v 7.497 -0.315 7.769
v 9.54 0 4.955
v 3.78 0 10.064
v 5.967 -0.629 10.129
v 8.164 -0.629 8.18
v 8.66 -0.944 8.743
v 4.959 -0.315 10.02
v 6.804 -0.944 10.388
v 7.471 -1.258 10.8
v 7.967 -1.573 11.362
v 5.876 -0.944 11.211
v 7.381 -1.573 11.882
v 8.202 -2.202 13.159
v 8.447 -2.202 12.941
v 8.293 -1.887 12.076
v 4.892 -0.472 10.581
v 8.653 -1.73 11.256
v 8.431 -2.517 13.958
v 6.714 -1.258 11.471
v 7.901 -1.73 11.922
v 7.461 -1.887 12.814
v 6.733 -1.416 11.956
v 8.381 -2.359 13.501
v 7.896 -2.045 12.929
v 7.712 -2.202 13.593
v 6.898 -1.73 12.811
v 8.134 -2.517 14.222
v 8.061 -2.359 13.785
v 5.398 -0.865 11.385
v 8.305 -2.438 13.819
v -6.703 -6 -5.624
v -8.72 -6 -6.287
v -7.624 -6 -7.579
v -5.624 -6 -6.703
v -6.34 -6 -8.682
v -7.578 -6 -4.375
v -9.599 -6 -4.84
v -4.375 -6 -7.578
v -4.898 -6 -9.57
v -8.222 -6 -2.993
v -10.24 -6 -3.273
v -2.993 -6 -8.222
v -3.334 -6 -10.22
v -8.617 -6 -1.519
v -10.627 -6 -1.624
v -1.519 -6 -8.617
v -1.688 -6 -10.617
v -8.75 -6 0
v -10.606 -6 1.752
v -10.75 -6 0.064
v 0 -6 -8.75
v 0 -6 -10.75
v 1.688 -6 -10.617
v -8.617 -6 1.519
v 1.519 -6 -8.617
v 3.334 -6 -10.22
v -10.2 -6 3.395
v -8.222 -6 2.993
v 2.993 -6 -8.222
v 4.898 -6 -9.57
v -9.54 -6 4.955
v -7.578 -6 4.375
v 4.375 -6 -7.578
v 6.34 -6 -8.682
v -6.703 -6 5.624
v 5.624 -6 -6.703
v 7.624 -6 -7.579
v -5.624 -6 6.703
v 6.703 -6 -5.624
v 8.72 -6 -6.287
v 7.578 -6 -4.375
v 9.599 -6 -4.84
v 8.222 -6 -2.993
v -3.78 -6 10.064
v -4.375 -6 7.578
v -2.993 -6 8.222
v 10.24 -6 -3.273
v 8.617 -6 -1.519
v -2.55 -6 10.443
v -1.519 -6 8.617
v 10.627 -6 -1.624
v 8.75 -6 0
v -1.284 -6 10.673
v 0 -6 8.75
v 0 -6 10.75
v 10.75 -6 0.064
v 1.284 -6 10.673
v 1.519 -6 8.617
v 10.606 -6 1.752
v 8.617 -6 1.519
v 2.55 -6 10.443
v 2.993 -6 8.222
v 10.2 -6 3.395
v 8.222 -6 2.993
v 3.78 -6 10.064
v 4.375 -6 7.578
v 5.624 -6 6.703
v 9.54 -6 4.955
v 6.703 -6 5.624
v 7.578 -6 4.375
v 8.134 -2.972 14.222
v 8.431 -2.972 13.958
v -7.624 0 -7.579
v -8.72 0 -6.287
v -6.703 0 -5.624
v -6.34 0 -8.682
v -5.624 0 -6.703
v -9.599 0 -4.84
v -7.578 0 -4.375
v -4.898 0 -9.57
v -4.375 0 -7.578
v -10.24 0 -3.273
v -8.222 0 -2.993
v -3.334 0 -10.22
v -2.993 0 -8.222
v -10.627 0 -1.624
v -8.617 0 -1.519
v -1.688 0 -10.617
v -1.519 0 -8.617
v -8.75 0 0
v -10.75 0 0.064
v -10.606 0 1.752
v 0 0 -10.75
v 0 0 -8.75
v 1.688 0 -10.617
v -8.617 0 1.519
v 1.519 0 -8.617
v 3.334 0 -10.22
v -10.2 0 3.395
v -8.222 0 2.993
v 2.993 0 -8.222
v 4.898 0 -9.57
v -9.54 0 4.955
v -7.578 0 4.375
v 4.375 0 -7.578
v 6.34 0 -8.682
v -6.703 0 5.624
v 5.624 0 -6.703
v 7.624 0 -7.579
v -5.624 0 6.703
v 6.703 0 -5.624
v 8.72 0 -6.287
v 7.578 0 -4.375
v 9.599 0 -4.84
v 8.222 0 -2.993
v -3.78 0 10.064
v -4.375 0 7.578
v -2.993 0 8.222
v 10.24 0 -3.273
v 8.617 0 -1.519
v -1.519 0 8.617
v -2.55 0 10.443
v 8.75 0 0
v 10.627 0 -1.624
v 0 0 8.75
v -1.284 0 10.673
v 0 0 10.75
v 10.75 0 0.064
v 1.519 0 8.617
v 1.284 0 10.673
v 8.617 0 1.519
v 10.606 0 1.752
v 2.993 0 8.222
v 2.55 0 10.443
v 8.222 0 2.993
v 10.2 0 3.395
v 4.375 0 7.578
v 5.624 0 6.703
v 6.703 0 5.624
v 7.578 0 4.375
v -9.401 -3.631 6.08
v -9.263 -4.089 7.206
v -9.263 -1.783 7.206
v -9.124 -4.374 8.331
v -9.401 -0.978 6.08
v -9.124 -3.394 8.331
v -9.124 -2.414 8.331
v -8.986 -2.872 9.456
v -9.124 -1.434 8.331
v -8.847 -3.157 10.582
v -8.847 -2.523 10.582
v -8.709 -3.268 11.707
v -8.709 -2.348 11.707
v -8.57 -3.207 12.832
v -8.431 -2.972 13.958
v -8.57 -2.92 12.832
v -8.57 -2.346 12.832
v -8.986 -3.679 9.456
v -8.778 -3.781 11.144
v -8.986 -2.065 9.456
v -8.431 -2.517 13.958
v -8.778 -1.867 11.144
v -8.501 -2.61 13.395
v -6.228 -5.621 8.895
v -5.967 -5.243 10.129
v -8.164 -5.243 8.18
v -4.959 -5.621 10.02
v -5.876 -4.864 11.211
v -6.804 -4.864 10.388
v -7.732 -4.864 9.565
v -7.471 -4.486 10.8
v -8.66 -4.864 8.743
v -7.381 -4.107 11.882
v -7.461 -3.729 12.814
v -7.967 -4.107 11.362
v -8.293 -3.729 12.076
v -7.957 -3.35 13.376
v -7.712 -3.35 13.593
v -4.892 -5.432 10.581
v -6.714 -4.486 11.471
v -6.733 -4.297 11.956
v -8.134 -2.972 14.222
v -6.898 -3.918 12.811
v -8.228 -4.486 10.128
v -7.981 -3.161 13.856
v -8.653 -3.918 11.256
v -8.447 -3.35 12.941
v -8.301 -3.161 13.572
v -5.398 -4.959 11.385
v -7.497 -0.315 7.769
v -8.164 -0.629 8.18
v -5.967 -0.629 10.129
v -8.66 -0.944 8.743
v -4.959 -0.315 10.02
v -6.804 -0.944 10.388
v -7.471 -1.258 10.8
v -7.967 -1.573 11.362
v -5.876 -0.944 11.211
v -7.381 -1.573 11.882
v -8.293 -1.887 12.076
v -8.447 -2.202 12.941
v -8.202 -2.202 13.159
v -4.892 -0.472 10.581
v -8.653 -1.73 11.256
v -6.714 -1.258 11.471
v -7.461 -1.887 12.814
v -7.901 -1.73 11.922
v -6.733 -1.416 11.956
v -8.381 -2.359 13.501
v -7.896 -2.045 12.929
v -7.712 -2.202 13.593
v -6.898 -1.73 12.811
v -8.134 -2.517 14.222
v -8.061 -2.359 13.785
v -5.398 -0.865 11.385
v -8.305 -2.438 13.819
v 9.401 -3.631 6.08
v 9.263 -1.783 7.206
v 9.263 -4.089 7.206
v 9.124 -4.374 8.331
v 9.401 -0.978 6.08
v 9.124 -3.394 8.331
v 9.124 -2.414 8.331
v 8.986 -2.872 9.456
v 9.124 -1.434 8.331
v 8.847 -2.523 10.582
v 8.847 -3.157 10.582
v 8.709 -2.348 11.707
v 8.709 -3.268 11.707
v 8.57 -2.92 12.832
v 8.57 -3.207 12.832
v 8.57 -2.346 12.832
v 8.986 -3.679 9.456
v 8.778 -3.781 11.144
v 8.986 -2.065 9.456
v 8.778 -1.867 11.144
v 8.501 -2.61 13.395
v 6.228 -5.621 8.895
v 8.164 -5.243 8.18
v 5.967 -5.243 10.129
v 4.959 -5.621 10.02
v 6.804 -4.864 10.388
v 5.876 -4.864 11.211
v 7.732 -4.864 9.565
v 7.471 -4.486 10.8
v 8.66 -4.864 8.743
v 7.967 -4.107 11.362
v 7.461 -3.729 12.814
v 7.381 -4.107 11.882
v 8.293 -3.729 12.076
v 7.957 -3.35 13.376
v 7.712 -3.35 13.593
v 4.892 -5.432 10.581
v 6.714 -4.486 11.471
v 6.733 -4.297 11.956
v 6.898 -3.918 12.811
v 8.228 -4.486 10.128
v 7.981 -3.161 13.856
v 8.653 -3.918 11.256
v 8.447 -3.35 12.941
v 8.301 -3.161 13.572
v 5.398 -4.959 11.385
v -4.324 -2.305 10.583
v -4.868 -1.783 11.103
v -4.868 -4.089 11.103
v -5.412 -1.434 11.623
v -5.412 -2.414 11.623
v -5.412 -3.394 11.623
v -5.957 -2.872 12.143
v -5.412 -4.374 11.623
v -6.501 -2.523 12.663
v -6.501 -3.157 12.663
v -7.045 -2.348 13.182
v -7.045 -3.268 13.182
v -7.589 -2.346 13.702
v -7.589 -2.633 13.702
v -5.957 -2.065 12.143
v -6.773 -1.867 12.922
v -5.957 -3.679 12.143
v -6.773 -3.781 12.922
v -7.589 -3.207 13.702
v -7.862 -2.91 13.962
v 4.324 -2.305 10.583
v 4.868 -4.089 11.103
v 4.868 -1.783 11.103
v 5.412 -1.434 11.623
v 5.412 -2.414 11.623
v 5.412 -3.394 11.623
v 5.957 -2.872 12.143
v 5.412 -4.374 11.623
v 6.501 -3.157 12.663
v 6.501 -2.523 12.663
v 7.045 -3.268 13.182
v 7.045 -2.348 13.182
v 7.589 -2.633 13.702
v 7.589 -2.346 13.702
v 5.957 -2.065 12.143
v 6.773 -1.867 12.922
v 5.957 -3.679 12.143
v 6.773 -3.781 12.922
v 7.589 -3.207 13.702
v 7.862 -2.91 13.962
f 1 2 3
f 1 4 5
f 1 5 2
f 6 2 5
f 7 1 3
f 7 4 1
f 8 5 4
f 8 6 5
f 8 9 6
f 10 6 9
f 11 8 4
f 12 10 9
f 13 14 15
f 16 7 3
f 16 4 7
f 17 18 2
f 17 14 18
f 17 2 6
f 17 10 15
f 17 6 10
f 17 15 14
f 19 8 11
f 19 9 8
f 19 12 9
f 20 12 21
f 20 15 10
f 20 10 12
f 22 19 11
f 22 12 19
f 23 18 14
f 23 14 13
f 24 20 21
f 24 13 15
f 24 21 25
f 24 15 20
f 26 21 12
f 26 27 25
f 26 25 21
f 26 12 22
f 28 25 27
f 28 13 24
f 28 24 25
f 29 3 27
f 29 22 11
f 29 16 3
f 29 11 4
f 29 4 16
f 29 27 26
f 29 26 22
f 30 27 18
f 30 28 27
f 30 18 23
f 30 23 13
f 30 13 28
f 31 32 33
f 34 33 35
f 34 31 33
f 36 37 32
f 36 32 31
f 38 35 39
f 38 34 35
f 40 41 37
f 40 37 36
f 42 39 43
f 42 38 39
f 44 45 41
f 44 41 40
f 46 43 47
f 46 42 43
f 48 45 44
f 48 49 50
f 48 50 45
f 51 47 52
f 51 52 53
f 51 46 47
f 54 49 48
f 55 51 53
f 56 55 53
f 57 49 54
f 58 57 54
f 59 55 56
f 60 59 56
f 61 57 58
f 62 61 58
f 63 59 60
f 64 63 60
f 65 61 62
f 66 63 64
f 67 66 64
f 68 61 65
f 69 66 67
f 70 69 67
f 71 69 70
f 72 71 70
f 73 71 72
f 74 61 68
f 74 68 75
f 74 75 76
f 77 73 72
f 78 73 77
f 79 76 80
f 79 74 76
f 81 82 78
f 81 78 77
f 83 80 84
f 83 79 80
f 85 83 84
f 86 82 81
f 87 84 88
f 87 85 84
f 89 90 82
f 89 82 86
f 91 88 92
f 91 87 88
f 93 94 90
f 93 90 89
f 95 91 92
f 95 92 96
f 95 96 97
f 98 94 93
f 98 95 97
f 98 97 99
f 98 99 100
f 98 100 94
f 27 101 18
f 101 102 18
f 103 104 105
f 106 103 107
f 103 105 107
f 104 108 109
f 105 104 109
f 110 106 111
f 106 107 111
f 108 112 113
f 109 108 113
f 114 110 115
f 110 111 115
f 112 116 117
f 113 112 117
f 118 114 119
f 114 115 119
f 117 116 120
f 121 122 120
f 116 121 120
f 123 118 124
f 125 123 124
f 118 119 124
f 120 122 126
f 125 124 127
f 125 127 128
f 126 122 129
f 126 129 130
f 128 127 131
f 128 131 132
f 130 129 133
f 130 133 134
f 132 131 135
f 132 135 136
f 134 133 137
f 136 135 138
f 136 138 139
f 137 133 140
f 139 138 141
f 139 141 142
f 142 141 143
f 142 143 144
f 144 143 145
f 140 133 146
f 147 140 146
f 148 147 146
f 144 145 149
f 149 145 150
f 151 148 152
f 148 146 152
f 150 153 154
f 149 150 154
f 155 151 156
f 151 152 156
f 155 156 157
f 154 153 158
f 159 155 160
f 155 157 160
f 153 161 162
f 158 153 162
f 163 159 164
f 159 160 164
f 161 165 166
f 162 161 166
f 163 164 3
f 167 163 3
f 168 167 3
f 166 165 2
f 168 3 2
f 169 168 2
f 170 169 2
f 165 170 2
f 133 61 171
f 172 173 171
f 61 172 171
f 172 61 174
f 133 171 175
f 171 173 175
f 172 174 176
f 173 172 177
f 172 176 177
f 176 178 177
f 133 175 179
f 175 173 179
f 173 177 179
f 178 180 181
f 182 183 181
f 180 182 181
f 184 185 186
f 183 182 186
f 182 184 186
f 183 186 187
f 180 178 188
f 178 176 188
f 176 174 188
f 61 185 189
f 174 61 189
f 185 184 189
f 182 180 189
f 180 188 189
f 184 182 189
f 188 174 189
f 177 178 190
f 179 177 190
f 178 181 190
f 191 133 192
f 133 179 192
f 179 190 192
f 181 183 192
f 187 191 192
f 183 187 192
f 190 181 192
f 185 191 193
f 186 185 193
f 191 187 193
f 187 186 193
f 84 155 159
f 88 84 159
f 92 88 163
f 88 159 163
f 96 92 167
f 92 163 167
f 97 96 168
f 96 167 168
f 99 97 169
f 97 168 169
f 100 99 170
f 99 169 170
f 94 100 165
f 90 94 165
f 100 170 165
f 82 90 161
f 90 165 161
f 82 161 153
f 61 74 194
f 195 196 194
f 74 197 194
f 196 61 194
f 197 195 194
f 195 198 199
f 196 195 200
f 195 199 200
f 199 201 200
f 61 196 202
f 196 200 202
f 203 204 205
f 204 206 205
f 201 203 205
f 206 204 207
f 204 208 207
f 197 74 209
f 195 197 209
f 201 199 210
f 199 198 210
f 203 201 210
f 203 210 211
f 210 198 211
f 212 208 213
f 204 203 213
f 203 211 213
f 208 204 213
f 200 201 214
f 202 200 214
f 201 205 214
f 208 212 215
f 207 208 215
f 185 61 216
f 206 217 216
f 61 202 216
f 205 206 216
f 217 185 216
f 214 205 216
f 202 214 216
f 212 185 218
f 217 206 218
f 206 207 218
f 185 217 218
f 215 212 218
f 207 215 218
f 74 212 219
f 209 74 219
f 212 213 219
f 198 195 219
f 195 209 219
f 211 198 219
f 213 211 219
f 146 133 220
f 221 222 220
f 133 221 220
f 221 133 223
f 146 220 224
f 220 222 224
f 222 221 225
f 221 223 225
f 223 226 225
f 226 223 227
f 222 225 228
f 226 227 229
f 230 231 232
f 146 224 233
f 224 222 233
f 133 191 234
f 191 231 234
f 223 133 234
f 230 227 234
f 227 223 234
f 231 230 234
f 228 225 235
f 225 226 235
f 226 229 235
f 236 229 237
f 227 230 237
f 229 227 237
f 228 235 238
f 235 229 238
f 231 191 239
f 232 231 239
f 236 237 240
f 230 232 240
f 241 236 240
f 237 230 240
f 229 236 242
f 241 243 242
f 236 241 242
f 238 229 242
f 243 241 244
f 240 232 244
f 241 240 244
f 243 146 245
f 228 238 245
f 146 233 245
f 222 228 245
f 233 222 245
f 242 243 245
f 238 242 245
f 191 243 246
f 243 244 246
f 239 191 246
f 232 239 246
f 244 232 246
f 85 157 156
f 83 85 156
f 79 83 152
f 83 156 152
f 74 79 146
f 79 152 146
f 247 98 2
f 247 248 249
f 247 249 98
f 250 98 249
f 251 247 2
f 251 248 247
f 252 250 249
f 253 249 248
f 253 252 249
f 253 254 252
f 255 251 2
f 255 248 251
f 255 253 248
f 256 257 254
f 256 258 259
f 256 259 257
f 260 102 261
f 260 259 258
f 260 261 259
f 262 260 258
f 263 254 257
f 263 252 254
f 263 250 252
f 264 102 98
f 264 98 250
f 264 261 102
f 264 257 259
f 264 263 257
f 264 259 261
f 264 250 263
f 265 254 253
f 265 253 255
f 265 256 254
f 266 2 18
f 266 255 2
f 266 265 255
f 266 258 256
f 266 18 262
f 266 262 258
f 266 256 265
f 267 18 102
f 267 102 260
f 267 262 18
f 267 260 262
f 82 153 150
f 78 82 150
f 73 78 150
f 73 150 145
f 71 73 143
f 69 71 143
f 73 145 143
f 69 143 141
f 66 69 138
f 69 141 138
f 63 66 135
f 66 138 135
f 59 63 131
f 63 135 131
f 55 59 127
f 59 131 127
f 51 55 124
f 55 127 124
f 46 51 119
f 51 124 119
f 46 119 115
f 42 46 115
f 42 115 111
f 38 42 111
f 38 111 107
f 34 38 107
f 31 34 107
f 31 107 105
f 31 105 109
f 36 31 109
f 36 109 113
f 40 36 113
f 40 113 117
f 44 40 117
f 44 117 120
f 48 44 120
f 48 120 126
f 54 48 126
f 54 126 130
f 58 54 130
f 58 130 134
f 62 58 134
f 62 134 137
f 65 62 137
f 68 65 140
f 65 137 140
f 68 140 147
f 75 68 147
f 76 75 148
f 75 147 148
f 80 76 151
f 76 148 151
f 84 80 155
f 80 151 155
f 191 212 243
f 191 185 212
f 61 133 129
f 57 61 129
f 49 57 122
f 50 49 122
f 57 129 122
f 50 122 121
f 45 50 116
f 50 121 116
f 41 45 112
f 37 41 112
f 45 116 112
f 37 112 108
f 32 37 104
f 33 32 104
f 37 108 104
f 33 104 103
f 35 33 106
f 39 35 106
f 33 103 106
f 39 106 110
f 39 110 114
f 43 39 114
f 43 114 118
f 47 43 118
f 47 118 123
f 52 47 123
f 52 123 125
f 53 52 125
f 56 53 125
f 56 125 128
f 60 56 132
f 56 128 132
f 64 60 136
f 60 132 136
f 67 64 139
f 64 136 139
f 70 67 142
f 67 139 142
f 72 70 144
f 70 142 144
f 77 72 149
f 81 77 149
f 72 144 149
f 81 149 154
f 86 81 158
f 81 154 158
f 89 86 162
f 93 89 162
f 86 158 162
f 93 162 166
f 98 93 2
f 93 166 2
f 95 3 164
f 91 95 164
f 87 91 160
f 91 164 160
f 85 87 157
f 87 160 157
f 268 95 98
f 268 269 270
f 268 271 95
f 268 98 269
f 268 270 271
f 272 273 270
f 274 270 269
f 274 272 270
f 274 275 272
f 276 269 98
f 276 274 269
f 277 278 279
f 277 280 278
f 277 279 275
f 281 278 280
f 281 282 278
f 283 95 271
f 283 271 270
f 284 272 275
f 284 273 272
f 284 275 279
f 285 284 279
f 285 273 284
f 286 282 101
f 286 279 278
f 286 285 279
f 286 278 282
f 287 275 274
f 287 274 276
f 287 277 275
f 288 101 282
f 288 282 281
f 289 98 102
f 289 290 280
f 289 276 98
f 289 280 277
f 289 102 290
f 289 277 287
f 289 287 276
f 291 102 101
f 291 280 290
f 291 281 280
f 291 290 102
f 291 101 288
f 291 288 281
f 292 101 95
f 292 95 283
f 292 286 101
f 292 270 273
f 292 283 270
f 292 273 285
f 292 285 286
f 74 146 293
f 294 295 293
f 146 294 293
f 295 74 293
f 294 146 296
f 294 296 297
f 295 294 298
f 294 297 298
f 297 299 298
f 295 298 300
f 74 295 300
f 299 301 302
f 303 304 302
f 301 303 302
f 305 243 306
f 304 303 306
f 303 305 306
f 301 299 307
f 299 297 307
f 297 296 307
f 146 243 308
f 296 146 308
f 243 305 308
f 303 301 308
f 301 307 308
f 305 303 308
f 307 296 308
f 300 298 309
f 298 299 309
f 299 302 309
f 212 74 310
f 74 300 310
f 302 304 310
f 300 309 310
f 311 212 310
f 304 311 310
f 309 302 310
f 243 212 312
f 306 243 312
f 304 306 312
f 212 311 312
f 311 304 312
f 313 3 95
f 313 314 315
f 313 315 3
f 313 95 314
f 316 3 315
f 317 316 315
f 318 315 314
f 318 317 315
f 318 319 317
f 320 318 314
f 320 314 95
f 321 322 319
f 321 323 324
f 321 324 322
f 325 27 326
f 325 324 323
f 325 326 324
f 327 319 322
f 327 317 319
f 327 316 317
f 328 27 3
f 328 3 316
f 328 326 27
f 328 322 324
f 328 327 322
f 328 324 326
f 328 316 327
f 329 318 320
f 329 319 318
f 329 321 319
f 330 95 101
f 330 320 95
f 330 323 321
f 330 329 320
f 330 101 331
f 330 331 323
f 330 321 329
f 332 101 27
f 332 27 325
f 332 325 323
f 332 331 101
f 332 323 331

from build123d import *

# Parameters (mm, degrees)
F1_DEPTH  = 6
F1_FACE_W = 6
F1_FACE_H = 7.6992507409
F3_W      = 0.3979424946
F3_H      = 0.4551622551


with BuildPart() as f1:
    # F0 (on Front) → F1 (new body)
    with BuildSketch(Plane.XZ):
        with BuildLine():
            ThreePointArc((3.7797707351, 10.0635894784), (1.9207958125, 10.5770054102), (0, 10.75))
            ThreePointArc((0, 10.75), (-1.9207958125, 10.5770054102), (-3.7797707351, 10.0635894784))
            Line((-3.7797707351, 10.0635894784), (-9.5399799449, 4.9549250904))
            ThreePointArc((-9.5399799449, 4.9549250904), (0, -10.75), (9.5399799449, 4.9549250904))
            Line((9.5399799449, 4.9549250904), (3.7797707351, 10.0635894784))
        make_face()
        with BuildLine():
            ThreePointArc((0, 8.75), (6.1871843354, 6.1871843354), (8.75, 0))
            ThreePointArc((8.75, 0), (-6.1871843354, -6.1871843354), (0, 8.75))
        make_face(mode=Mode.SUBTRACT)
    extrude(amount=F1_DEPTH)

    # F1_face (on face) → F4 section 0
    with BuildSketch(Plane(origin=(6.65987534, -3, 7.5092572844), x_dir=(0, 1, 0), z_dir=(0.663527473, 0, 0.7481519181))):
        Rectangle(F1_FACE_W, F1_FACE_H)
    # F3 (on offset) → F4 section 1
    with BuildSketch(Plane(origin=(10.641040178, 0, 11.9981687931), x_dir=(0.7481519181, 0, -0.663527473), z_dir=(0.663527473, 0, 0.7481519181))):
        with Locations((-3.1523916405, -2.7441481361)):
            Rectangle(F3_W, F3_H)
    loft()

    # F5: F1 across plane


with BuildPart() as f1_1:
    add(f1.part)
    add(f1.part.mirror(Plane.YZ))


solid = f1_1.part
